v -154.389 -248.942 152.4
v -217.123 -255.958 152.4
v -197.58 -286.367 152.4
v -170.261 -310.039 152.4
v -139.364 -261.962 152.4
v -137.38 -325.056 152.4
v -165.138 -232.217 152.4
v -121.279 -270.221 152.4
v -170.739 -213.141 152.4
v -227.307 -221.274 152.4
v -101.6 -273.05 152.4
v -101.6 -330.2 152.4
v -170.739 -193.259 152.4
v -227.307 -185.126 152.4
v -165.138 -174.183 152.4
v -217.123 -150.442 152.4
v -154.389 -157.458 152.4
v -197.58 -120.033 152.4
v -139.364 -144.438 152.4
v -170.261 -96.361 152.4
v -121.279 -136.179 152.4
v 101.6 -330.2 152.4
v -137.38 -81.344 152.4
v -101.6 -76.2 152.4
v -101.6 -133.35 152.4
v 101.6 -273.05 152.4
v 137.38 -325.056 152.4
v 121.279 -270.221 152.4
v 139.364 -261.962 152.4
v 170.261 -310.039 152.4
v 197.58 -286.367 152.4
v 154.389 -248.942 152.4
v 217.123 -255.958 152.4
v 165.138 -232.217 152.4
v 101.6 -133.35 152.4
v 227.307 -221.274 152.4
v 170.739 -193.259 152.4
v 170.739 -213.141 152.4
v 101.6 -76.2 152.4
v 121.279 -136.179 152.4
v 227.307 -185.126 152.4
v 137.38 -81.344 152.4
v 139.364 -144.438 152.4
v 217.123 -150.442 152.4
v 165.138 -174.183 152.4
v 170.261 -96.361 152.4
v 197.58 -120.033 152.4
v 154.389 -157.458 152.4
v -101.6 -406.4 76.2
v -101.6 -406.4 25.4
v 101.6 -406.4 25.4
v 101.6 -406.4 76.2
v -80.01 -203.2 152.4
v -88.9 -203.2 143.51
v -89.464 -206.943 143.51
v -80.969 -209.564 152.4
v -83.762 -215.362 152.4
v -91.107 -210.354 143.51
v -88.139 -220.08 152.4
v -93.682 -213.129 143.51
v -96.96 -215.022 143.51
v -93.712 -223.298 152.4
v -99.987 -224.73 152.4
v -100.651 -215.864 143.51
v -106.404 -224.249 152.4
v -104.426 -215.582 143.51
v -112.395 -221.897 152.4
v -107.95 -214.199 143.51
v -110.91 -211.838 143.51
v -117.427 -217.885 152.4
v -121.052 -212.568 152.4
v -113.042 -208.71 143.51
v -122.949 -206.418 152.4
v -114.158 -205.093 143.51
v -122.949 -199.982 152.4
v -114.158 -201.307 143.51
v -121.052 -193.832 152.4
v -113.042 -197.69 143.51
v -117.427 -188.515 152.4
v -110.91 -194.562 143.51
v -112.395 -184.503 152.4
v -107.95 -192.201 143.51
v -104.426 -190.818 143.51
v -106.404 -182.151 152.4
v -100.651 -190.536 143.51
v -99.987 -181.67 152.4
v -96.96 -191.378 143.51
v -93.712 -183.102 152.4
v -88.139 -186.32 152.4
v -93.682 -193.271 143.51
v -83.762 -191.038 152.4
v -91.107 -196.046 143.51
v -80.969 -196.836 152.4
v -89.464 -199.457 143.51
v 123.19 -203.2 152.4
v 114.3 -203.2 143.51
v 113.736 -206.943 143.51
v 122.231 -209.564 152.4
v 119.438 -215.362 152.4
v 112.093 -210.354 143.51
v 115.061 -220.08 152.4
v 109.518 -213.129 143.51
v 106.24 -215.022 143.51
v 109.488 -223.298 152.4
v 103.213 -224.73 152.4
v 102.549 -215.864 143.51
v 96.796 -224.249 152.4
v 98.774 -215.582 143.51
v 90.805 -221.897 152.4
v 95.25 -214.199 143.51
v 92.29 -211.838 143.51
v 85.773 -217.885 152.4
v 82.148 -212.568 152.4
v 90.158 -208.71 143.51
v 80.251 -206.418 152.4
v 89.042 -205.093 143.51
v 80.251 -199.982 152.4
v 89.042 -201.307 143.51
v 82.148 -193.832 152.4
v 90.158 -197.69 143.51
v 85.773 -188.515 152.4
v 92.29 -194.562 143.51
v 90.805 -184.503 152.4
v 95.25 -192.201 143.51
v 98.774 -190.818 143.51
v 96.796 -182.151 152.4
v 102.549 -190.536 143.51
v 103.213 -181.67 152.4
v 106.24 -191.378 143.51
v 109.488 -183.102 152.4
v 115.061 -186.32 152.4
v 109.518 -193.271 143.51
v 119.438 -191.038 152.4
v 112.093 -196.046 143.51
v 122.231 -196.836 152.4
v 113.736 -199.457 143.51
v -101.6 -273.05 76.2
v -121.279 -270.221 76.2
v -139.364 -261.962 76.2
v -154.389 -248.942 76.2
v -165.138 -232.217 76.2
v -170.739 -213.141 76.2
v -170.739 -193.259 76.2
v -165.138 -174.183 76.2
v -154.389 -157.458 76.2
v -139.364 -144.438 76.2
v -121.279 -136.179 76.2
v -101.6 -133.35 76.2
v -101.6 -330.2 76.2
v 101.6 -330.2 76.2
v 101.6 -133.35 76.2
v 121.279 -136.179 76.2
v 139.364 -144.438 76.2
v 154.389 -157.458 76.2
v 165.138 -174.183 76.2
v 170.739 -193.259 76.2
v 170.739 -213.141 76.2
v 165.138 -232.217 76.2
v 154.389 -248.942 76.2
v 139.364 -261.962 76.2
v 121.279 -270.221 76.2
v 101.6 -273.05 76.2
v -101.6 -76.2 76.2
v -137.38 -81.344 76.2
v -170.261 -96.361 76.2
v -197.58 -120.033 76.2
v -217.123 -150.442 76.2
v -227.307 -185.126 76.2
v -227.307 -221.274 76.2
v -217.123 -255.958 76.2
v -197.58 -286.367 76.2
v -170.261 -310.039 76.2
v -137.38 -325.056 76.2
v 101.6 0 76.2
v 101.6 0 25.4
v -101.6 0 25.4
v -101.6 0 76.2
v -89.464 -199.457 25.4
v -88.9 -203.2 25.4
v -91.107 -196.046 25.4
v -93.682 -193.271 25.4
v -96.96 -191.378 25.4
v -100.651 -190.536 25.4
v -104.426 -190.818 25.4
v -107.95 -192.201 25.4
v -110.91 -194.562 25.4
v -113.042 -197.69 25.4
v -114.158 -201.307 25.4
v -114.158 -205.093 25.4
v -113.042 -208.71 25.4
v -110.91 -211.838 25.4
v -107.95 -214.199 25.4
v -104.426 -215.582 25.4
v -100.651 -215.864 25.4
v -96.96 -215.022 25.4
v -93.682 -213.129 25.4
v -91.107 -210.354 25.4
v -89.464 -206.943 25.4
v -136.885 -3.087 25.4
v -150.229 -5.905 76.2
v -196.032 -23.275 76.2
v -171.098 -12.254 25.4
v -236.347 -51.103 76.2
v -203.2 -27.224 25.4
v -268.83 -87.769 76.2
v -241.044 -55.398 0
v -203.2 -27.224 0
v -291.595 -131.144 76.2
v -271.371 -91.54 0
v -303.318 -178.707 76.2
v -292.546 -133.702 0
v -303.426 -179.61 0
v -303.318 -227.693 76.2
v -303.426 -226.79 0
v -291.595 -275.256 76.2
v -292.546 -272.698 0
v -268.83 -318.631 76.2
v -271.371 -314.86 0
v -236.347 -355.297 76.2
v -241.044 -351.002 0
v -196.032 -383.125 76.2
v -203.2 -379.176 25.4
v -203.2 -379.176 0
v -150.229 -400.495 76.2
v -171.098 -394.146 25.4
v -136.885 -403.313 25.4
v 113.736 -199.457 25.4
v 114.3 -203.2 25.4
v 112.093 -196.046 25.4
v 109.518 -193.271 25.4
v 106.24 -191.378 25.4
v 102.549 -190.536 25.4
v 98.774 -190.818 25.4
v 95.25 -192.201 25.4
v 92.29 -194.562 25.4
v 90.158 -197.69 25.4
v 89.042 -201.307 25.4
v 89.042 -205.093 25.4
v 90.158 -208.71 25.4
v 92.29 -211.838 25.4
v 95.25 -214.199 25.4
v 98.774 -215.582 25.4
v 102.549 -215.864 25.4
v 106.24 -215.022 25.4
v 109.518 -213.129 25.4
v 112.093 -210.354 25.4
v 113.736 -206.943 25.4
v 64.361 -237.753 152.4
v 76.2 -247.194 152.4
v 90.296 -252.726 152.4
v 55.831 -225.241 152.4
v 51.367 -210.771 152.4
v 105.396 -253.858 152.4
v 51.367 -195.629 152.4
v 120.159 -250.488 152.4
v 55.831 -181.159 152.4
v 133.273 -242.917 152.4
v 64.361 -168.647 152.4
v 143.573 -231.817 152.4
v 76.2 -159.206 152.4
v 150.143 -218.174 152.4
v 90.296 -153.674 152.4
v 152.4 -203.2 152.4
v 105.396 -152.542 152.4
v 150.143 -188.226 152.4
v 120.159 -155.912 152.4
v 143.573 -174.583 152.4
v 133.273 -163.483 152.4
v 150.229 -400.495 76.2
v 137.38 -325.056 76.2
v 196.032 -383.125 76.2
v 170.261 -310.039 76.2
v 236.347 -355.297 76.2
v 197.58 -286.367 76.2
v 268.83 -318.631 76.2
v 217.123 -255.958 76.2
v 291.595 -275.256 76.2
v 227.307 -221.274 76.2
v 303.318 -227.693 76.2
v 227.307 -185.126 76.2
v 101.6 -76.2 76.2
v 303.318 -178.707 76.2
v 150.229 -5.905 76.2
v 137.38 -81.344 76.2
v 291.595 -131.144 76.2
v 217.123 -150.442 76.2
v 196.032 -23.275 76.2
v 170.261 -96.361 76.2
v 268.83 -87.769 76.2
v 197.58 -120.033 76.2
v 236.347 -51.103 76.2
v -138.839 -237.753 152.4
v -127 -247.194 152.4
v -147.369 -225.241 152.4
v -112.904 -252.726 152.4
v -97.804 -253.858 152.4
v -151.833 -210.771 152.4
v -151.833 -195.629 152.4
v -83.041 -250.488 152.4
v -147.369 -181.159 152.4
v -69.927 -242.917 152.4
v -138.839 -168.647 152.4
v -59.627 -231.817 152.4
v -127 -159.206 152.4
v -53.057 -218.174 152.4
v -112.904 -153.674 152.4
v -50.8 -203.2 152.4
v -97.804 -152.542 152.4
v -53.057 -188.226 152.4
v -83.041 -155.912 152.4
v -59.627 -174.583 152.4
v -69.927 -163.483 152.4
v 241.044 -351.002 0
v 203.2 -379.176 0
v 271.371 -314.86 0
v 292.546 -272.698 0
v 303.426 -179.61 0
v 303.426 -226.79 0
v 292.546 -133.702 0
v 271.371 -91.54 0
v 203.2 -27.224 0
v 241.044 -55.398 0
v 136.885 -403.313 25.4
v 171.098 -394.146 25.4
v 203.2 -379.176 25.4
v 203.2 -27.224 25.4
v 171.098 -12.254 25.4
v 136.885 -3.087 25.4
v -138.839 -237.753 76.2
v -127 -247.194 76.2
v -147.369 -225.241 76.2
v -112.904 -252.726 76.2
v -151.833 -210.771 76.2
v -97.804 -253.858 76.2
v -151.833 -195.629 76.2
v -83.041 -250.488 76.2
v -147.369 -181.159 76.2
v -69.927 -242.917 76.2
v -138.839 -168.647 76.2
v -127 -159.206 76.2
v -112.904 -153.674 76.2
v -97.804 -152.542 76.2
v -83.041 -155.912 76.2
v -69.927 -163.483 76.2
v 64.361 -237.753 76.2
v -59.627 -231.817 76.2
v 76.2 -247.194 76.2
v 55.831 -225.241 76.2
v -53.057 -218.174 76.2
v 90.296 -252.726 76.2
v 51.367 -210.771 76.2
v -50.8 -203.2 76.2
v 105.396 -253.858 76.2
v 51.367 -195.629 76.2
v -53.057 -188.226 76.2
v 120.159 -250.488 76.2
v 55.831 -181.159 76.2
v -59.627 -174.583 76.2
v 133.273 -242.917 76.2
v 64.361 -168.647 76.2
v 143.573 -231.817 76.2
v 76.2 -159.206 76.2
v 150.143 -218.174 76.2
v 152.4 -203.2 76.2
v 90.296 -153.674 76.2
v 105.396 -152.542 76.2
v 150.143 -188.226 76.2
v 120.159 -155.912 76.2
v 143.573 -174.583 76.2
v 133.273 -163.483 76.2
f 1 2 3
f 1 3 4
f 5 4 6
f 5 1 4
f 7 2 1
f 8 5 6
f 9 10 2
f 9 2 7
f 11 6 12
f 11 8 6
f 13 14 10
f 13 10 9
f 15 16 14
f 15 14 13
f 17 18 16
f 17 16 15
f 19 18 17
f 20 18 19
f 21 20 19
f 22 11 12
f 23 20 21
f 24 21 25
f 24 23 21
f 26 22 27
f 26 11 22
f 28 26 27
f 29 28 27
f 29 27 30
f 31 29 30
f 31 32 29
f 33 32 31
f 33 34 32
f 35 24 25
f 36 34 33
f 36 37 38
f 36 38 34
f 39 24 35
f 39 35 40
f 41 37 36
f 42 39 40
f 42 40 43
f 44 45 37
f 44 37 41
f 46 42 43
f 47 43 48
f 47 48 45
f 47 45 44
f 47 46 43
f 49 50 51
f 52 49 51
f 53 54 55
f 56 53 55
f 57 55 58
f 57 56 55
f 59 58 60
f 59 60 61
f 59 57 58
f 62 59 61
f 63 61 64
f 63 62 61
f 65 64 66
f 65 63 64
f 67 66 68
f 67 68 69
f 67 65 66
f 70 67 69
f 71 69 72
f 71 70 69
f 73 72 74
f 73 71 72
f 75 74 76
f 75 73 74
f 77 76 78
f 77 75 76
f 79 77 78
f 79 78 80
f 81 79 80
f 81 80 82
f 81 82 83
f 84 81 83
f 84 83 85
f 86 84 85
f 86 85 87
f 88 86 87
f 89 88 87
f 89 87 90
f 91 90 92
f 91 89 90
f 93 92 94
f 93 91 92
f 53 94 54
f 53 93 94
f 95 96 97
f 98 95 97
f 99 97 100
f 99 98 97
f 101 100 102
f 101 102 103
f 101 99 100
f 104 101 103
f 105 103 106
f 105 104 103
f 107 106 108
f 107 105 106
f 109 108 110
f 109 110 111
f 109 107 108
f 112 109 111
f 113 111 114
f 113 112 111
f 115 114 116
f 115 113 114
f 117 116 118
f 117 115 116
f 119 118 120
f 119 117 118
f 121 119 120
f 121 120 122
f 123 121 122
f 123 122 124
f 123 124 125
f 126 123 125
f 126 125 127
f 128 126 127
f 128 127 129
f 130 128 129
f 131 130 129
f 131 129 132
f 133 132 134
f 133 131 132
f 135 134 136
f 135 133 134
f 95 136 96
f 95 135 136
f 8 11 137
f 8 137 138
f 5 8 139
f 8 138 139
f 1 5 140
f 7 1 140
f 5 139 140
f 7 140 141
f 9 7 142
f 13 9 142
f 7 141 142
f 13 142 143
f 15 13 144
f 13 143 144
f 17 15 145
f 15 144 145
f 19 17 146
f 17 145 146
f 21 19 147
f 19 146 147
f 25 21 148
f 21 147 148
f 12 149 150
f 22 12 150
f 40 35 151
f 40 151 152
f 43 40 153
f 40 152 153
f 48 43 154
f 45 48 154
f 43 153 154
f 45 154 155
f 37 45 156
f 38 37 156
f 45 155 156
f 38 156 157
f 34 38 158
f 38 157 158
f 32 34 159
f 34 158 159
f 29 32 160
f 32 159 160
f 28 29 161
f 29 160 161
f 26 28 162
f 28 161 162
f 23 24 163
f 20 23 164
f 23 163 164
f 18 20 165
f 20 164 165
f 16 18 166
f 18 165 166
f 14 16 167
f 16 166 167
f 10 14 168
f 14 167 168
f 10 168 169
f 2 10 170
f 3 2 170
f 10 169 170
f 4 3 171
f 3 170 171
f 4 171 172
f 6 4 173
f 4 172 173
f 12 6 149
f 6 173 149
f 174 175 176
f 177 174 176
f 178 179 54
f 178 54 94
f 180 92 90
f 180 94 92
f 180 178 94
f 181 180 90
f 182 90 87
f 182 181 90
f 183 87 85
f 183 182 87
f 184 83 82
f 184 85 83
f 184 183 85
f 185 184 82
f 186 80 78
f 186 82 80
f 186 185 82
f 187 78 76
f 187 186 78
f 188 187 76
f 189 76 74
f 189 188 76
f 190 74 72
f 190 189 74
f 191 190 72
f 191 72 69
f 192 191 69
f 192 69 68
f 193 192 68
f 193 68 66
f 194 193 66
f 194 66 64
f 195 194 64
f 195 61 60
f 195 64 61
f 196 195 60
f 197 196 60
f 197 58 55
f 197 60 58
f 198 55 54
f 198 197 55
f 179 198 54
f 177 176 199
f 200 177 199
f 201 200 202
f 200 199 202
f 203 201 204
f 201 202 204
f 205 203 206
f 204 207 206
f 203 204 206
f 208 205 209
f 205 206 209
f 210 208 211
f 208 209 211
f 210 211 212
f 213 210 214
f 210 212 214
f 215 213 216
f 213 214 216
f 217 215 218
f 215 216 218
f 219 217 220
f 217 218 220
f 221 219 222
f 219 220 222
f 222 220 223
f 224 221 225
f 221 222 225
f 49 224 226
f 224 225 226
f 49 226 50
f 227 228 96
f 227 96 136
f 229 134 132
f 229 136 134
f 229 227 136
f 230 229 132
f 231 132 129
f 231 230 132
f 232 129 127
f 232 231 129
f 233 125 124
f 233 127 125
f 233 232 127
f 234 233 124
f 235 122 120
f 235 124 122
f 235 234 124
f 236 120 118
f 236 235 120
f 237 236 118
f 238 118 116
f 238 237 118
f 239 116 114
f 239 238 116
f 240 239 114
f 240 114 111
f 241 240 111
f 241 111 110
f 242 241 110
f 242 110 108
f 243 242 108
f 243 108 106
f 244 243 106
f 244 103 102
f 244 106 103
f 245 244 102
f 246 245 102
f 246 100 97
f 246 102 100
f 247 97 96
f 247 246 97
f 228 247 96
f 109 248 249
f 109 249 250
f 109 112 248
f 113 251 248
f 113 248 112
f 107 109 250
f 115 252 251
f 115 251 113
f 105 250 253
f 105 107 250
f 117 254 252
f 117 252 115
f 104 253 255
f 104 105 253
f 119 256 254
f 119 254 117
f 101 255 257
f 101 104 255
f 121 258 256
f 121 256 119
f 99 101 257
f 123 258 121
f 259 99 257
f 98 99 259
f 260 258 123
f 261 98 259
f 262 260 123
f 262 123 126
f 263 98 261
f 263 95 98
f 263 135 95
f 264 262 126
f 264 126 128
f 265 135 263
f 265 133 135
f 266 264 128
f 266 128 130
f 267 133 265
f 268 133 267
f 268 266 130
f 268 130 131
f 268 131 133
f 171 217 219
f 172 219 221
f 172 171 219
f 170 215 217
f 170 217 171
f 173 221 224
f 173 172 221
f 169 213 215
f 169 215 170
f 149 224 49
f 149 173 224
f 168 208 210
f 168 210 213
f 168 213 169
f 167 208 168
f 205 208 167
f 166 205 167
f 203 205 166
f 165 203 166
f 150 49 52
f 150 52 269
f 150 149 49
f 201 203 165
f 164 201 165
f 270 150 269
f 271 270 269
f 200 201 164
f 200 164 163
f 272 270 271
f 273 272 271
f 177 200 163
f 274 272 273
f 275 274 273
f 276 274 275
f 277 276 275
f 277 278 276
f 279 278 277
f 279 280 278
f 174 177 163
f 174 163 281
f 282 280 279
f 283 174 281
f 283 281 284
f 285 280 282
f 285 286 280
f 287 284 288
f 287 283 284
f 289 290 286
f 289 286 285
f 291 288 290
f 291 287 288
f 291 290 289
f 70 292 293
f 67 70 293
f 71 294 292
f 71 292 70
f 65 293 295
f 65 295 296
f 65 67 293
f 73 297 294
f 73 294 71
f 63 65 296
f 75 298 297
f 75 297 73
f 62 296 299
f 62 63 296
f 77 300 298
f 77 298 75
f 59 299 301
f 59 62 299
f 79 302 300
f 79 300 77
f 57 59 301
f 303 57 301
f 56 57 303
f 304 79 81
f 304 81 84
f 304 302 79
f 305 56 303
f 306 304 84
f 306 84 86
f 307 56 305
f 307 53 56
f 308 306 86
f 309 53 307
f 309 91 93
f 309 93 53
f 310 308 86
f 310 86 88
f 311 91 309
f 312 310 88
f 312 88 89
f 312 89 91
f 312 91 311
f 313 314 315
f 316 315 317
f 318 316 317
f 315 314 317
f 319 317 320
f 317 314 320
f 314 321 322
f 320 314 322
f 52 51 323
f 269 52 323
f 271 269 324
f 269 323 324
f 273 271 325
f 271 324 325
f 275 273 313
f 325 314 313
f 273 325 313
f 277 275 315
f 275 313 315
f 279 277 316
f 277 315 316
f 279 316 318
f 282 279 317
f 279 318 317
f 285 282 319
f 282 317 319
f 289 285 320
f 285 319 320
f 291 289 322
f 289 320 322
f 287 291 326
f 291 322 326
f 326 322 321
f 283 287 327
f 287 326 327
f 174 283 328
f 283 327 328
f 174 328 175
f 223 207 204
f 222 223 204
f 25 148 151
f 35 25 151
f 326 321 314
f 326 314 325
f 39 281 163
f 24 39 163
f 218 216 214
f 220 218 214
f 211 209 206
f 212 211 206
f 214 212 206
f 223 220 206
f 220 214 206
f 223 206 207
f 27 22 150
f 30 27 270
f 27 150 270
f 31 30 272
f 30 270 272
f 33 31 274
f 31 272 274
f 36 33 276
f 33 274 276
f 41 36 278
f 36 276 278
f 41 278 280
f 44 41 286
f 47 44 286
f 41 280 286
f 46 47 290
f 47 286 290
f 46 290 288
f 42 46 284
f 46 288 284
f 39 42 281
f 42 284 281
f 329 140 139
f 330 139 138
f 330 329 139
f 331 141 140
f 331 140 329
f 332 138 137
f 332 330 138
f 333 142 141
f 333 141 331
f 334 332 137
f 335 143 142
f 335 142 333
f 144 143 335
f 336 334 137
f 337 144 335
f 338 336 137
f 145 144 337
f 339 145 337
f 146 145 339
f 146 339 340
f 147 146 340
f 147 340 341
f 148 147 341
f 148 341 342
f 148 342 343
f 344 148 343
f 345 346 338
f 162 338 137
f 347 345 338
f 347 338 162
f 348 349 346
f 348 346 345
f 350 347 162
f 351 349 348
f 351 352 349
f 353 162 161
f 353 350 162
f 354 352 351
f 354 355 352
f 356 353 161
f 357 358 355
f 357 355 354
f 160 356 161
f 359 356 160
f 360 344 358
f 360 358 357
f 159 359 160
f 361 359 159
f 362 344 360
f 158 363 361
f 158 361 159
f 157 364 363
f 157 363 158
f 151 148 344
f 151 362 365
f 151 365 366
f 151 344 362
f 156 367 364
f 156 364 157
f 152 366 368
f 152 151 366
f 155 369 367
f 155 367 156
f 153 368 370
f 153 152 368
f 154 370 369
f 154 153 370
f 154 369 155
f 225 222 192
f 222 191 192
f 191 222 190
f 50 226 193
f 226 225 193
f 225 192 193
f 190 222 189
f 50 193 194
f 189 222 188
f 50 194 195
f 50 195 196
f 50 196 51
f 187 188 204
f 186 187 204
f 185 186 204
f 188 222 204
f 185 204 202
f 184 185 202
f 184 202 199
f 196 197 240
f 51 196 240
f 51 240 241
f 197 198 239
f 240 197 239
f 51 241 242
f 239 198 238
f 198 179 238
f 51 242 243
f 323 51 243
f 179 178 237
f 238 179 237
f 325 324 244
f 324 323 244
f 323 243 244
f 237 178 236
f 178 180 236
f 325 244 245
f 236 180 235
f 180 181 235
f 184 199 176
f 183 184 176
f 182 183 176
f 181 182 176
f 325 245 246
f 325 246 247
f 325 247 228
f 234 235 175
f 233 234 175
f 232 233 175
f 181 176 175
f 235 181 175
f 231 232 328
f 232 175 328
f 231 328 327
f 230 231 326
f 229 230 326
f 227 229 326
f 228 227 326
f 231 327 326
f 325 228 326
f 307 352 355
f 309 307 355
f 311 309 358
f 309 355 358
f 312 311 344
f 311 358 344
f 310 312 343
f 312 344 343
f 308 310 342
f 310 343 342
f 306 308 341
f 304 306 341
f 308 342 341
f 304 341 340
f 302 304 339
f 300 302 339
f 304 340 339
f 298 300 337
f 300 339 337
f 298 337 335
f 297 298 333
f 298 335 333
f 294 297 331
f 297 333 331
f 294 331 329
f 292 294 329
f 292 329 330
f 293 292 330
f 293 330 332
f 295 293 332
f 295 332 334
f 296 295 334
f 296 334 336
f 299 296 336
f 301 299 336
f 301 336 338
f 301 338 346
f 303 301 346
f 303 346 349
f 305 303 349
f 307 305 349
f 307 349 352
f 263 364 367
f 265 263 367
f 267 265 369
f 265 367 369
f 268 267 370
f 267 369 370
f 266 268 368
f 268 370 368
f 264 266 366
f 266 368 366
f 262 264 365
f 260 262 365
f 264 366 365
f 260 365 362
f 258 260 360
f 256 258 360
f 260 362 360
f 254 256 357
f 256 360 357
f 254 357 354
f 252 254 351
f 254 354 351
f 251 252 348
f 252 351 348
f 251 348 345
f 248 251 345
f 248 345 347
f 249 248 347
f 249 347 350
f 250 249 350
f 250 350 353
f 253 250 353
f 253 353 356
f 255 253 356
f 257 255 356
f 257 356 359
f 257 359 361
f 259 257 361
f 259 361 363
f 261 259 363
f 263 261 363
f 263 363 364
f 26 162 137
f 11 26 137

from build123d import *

# Parameters (mm, degrees)
F0_R     = 50.8
F0_R_2   = 25.4
F0_R_3   = 12.7
F2_DEPTH = 76.2
F3_DEPTH = 152.4
F4_DEPTH = 281.178
F5_SIZE  = 8.89
F1_W     = 406.4
F1_H     = 25.4
F6_DEPTH = 715.518


with BuildPart() as f2:
    # F0 (on Top) → F2 (new body)
    with BuildSketch(Plane.XY):
        with BuildLine():
            Line((101.6, 0), (-101.6, 0))
            ThreePointArc((-101.6, 0), (-304.8, -203.2), (-101.6, -406.4))
            Line((-101.6, -406.4), (101.6, -406.4))
            ThreePointArc((101.6, -406.4), (304.8, -203.2), (101.6, 0))
        make_face()
        with BuildLine():
            ThreePointArc((-101.6, -330.2), (-228.6, -203.2), (-101.6, -76.2))
            Line((-101.6, -76.2), (101.6, -76.2))
            ThreePointArc((101.6, -76.2), (228.6, -203.2), (101.6, -330.2))
            Line((101.6, -330.2), (-101.6, -330.2))
        make_face(mode=Mode.SUBTRACT)
        with BuildLine():
            Line((101.6, -76.2), (-101.6, -76.2))
            ThreePointArc((-101.6, -76.2), (-228.6, -203.2), (-101.6, -330.2))
            Line((-101.6, -330.2), (101.6, -330.2))
            ThreePointArc((101.6, -330.2), (228.6, -203.2), (101.6, -76.2))
        make_face()
        with BuildLine():
            ThreePointArc((101.6, -133.35), (171.45, -203.2), (101.6, -273.05))
            Line((101.6, -273.05), (-101.6, -273.05))
            ThreePointArc((-101.6, -273.05), (-171.45, -203.2), (-101.6, -133.35))
            Line((-101.6, -133.35), (101.6, -133.35))
        make_face(mode=Mode.SUBTRACT)
        with BuildLine():
            Line((-101.6, -273.05), (101.6, -273.05))
            ThreePointArc((101.6, -273.05), (171.45, -203.2), (101.6, -133.35))
            Line((101.6, -133.35), (-101.6, -133.35))
            ThreePointArc((-101.6, -133.35), (-171.45, -203.2), (-101.6, -273.05))
        make_face()
        with Locations((-101.6, -203.2)):
            Circle(F0_R, mode=Mode.SUBTRACT)
        with Locations((101.6, -203.2)):
            Circle(F0_R, mode=Mode.SUBTRACT)
        with Locations((101.6, -203.2)):
            Circle(F0_R)
        with Locations((101.6, -203.2)):
            Circle(F0_R_2, mode=Mode.SUBTRACT)
        with Locations((-101.6, -203.2)):
            Circle(F0_R)
        with Locations((-101.6, -203.2)):
            Circle(F0_R_2, mode=Mode.SUBTRACT)
        with Locations((101.6, -203.2)):
            Circle(F0_R_2)
        with Locations((101.6, -203.2)):
            Circle(F0_R_3, mode=Mode.SUBTRACT)
        with Locations((-101.6, -203.2)):
            Circle(F0_R_2)
        with Locations((-101.6, -203.2)):
            Circle(F0_R_3, mode=Mode.SUBTRACT)
        with Locations((101.6, -203.2)):
            Circle(F0_R_3)
        with Locations((-101.6, -203.2)):
            Circle(F0_R_3)
    extrude(amount=F2_DEPTH)

    # F0 (on Top) → F3 (join)
    with BuildSketch(Plane.XY):
        with BuildLine():
            Line((101.6, -76.2), (-101.6, -76.2))
            ThreePointArc((-101.6, -76.2), (-228.6, -203.2), (-101.6, -330.2))
            Line((-101.6, -330.2), (101.6, -330.2))
            ThreePointArc((101.6, -330.2), (228.6, -203.2), (101.6, -76.2))
        make_face()
        with BuildLine():
            ThreePointArc((101.6, -133.35), (171.45, -203.2), (101.6, -273.05))
            Line((101.6, -273.05), (-101.6, -273.05))
            ThreePointArc((-101.6, -273.05), (-171.45, -203.2), (-101.6, -133.35))
            Line((-101.6, -133.35), (101.6, -133.35))
        make_face(mode=Mode.SUBTRACT)
        with Locations((101.6, -203.2)):
            Circle(F0_R)
        with Locations((101.6, -203.2)):
            Circle(F0_R_2, mode=Mode.SUBTRACT)
        with Locations((-101.6, -203.2)):
            Circle(F0_R)
        with Locations((-101.6, -203.2)):
            Circle(F0_R_2, mode=Mode.SUBTRACT)
        with Locations((101.6, -203.2)):
            Circle(F0_R_2)
        with Locations((101.6, -203.2)):
            Circle(F0_R_3, mode=Mode.SUBTRACT)
        with Locations((-101.6, -203.2)):
            Circle(F0_R_2)
        with Locations((-101.6, -203.2)):
            Circle(F0_R_3, mode=Mode.SUBTRACT)
        with Locations((101.6, -203.2)):
            Circle(F0_R_3)
        with Locations((-101.6, -203.2)):
            Circle(F0_R_3)
    extrude(amount=F3_DEPTH)

    # F0 (on Top) → F4 (cut)
    with BuildSketch(Plane.XY):
        with Locations((101.6, -203.2)):
            Circle(F0_R_3)
        with Locations((-101.6, -203.2)):
            Circle(F0_R_3)
    extrude(amount=F4_DEPTH, mode=Mode.SUBTRACT)

    # F5
    f5_edges = [f2.edges().sort_by_distance(p)[0] for p in [
        (88.9, -203.2, 0),
        (114.3, -203.2, 76.2),
        (88.9, -203.2, 152.4),
        (-114.3, -203.2, 0),
        (-88.9, -203.2, 76.2),
        (-114.3, -203.2, 152.4),
    ]]
    chamfer(f5_edges, length=F5_SIZE)

    # F1 (on Front) → F6 (cut)
    with BuildSketch(Plane.XZ):
        with Locations((0, 12.7)):
            Rectangle(F1_W, F1_H)
    extrude(amount=F6_DEPTH, mode=Mode.SUBTRACT)


solid = f2.part
